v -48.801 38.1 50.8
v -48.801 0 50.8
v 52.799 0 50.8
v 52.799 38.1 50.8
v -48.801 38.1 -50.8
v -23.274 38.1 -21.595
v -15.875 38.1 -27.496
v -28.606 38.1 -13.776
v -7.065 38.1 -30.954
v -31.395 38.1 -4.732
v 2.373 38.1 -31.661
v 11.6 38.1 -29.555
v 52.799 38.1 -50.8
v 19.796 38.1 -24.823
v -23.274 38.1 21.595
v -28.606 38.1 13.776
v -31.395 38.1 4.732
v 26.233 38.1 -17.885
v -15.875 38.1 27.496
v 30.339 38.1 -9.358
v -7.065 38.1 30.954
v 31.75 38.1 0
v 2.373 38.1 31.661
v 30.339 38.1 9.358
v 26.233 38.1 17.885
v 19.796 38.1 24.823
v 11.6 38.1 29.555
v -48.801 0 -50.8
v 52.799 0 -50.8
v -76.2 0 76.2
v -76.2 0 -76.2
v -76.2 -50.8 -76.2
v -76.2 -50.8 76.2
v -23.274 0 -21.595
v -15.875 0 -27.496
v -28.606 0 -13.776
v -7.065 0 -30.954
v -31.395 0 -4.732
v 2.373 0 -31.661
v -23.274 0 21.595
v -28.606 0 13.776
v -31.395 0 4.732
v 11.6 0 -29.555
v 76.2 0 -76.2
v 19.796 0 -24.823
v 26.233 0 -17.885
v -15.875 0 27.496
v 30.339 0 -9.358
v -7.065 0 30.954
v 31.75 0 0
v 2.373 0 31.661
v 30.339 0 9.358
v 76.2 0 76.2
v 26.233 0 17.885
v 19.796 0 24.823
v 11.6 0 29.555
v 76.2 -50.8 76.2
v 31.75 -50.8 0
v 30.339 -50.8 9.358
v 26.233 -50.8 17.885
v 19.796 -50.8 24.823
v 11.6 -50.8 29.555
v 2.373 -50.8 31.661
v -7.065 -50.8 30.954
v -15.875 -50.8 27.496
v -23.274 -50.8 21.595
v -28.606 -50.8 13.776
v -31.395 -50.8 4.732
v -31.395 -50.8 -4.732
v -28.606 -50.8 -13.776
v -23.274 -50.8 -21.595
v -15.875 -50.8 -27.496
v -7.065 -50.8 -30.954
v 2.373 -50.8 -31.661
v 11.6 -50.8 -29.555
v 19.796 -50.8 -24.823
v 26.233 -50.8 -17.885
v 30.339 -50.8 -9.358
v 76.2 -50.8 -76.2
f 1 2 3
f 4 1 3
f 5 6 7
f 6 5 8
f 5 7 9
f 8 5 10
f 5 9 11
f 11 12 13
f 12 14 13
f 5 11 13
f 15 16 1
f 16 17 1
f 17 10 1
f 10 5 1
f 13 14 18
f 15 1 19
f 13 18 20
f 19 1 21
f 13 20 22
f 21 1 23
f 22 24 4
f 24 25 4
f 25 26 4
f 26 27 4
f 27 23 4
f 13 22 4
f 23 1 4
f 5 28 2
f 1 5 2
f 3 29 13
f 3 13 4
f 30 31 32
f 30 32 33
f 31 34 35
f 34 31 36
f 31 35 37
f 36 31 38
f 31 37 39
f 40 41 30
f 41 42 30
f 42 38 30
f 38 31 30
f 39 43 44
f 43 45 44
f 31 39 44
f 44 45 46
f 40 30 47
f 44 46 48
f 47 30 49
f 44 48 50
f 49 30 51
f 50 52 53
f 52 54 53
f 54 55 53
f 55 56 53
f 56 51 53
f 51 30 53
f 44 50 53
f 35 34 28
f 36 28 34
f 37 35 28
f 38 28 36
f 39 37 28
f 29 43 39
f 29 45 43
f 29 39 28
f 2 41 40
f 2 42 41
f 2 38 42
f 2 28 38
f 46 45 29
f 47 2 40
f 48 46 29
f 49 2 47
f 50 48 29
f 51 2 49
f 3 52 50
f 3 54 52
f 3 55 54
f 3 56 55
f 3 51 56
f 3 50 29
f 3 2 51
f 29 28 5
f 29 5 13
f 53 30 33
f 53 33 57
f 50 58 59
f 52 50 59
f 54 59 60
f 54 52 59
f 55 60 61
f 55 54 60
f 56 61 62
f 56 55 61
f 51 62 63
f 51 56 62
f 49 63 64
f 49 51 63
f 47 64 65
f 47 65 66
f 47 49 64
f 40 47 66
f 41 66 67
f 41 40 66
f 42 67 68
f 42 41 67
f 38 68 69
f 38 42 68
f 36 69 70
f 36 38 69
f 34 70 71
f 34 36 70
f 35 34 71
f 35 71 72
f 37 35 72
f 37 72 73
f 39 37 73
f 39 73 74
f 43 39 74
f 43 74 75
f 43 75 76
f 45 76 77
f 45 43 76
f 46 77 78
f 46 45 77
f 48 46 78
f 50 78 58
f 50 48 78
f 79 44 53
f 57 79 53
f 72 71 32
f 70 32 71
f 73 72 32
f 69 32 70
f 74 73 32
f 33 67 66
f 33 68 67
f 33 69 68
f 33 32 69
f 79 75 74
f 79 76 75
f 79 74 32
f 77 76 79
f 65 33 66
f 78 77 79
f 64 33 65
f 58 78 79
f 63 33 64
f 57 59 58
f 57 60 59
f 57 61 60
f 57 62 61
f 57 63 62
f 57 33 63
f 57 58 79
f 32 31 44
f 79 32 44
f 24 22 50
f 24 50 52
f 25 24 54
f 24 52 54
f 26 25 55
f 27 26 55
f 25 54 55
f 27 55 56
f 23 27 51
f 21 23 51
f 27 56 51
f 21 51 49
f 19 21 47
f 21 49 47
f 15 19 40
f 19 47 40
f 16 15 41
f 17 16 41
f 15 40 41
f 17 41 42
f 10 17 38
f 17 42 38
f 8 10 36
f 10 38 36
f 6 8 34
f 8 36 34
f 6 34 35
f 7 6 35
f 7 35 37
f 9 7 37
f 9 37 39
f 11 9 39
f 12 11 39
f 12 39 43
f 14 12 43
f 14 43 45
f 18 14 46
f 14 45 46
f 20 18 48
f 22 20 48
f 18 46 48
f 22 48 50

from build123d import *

# Parameters (mm, degrees)
F0_W     = 101.6
F0_H     = 101.6
F0_R     = 31.75
F1_DEPTH = 38.1
F0_W_2   = 152.4
F0_H_2   = 152.4
F2_DEPTH = 50.8


with BuildPart() as f1:
    # F0 (on Front) → F1 (new body)
    with BuildSketch(Plane.XZ):
        with Locations((1.999011, 0)):
            Rectangle(F0_W, F0_H)
        Circle(F0_R, mode=Mode.SUBTRACT)
    extrude(amount=-F1_DEPTH)


with BuildPart() as f2:
    # F0 (on Front) → F2 (new body)
    with BuildSketch(Plane.XZ):
        Rectangle(F0_W_2, F0_H_2)
        with Locations((1.999011, 0)):
            Rectangle(F0_W, F0_H, mode=Mode.SUBTRACT)
        with Locations((1.999011, 0)):
            Rectangle(F0_W, F0_H)
        Circle(F0_R, mode=Mode.SUBTRACT)
    extrude(amount=F2_DEPTH)


solid = Compound([f1.part, f2.part])
